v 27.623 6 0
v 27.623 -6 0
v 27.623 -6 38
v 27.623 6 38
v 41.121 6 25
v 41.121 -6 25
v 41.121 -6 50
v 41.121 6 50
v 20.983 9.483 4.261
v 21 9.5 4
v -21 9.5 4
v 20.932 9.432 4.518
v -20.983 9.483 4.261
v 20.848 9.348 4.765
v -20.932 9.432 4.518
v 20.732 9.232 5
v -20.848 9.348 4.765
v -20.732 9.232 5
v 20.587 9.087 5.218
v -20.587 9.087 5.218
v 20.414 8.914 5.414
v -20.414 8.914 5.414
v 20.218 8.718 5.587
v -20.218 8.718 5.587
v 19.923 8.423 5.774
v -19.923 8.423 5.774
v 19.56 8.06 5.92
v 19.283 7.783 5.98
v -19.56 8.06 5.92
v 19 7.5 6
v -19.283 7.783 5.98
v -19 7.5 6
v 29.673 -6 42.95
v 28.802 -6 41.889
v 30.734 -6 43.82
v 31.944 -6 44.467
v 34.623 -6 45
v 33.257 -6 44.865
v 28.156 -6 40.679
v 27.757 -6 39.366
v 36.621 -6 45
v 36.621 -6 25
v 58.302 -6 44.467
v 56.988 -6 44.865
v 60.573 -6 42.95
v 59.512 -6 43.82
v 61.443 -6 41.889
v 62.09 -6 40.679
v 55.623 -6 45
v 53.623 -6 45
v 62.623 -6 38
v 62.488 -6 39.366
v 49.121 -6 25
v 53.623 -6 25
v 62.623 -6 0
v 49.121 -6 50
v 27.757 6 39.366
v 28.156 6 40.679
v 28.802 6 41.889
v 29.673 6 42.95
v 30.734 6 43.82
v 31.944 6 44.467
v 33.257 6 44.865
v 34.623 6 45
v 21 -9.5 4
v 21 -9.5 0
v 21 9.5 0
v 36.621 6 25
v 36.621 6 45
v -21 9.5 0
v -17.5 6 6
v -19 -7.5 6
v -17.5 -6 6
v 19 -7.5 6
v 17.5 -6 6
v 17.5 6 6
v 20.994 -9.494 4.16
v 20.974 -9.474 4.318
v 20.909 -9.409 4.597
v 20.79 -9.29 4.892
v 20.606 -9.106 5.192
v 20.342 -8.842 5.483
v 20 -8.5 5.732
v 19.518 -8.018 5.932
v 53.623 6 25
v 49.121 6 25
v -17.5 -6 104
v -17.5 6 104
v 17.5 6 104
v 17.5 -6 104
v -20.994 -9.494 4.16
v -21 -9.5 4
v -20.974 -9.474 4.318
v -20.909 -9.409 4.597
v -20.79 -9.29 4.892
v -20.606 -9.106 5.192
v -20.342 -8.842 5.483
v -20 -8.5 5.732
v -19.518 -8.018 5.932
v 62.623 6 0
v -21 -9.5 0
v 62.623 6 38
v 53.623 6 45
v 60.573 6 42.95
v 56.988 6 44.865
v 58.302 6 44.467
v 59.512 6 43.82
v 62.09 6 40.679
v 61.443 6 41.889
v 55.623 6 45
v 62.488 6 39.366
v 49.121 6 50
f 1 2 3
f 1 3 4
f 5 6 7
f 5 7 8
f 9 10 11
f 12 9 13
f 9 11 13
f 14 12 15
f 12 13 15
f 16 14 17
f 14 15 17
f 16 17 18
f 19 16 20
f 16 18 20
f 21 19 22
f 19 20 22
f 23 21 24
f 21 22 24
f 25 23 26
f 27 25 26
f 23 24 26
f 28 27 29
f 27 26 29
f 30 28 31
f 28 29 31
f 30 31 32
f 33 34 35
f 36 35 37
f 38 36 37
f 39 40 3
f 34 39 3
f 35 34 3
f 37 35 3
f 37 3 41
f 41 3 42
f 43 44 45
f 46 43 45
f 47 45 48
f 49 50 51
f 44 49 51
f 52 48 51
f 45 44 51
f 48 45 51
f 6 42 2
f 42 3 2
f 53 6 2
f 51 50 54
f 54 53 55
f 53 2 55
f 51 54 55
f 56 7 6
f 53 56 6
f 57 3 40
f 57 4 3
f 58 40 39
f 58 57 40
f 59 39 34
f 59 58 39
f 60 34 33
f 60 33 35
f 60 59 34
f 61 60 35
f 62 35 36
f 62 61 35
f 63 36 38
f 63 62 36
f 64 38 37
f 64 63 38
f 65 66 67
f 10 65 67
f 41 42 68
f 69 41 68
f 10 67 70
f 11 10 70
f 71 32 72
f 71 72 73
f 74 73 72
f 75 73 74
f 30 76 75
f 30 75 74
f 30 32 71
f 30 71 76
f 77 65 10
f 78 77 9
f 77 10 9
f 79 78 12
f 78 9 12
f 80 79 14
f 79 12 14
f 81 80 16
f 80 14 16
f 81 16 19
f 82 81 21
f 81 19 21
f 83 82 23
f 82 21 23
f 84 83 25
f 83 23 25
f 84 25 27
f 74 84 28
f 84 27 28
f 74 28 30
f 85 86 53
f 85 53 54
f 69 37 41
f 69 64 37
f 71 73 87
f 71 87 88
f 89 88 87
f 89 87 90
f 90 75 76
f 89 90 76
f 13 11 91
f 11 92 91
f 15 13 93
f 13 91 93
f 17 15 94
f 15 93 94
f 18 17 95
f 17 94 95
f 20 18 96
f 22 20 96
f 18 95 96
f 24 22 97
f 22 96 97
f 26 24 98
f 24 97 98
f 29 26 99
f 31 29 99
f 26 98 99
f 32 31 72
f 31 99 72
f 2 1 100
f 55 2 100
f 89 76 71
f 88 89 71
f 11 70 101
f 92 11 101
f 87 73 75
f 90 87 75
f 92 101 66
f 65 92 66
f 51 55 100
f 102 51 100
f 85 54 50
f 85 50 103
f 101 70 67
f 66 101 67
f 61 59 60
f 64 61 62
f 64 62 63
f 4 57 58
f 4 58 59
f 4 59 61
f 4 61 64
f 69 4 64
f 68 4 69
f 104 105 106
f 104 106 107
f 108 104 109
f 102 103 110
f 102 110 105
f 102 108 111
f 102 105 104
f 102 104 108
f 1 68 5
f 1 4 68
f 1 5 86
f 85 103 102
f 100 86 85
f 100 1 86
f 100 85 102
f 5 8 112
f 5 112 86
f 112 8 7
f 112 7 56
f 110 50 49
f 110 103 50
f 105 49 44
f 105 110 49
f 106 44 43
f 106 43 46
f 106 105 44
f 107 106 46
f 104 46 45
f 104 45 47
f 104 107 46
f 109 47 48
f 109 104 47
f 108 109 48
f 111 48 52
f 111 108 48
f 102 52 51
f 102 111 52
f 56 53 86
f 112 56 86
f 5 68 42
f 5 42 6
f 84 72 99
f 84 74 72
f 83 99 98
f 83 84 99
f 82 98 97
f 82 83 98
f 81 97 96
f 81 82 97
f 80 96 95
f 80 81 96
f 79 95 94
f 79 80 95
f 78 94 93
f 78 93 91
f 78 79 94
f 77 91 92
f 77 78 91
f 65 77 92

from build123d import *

# Parameters (mm, degrees)
F0_W     = 9
F0_H     = 12
F0_W_2   = 4.5
F0_W_3   = 8
F1_DEPTH = 104
F2_DEPTH = 6
F3_R     = 2
F4_DEPTH = 50
F0_W_4   = 4.502212
F5_DEPTH = 25
F0_W_5   = 8.997788
F6_DEPTH = 45
F7_R     = 7


with BuildPart() as f1:
    # F0 (on Top) → F1 (new body)
    with BuildSketch(Plane.XY):
        with Locations((-13, 0)):
            Rectangle(F0_W, F0_H)
        with Locations((13, 0)):
            Rectangle(F0_W, F0_H)
        with Locations((-6.25, 0)):
            Rectangle(F0_W_2, F0_H)
        Rectangle(F0_W_3, F0_H)
        with Locations((6.25, 0)):
            Rectangle(F0_W_2, F0_H)
    extrude(amount=F1_DEPTH)

    # F0 (on Top) → F2 (join)
    with BuildSketch(Plane.XY):
        Polygon((-17.5, -6), (-17.5, 6), (-21, 9.5), (-21, -9.5), align=None)
        Polygon((-8.5, -6), (-17.5, -6), (-21, -9.5), (21, -9.5), (17.5, -6), (8.5, -6), (4, -6), (-4, -6), align=None)
        Polygon((-21, 9.5), (-17.5, 6), (-8.5, 6), (-4, 6), (4, 6), (8.5, 6), (17.5, 6), (21, 9.5), align=None)
        Polygon((21, -9.5), (21, 9.5), (17.5, 6), (17.5, -6), align=None)
    extrude(amount=F2_DEPTH)

    # F3
    f3_edges = [f1.edges().sort_by_distance(p)[0] for p in [
        (0, -9.5, 6),
        (21, 0, 6),
        (0, 9.5, 6),
        (-21, 0, 6),
    ]]
    fillet(f3_edges, radius=F3_R)


with BuildPart() as f4:
    # F0 (on Top) → F4 (new body)
    with BuildSketch(Plane.XY):
        with Locations((45.120575, 0)):
            Rectangle(F0_W_3, F0_H)
    extrude(amount=F4_DEPTH)

    # F0 (on Top) → F5 (join)
    with BuildSketch(Plane.XY):
        with Locations((38.870575, 0)):
            Rectangle(F0_W_2, F0_H)
        with Locations((51.371681, 0)):
            Rectangle(F0_W_4, F0_H)
    extrude(amount=F5_DEPTH)

    # F0 (on Top) → F6 (join)
    with BuildSketch(Plane.XY):
        with Locations((32.121681, 0)):
            Rectangle(F0_W_5, F0_H)
        with Locations((58.122787, 0)):
            Rectangle(F0_W, F0_H)
    extrude(amount=F6_DEPTH)

    # F7
    f7_edges = [f4.edges().sort_by_distance(p)[0] for p in [
        (27.622787, 0, 45),
        (62.622787, 0, 45),
    ]]
    fillet(f7_edges, radius=F7_R)


solid = Compound([f1.part, f4.part])
